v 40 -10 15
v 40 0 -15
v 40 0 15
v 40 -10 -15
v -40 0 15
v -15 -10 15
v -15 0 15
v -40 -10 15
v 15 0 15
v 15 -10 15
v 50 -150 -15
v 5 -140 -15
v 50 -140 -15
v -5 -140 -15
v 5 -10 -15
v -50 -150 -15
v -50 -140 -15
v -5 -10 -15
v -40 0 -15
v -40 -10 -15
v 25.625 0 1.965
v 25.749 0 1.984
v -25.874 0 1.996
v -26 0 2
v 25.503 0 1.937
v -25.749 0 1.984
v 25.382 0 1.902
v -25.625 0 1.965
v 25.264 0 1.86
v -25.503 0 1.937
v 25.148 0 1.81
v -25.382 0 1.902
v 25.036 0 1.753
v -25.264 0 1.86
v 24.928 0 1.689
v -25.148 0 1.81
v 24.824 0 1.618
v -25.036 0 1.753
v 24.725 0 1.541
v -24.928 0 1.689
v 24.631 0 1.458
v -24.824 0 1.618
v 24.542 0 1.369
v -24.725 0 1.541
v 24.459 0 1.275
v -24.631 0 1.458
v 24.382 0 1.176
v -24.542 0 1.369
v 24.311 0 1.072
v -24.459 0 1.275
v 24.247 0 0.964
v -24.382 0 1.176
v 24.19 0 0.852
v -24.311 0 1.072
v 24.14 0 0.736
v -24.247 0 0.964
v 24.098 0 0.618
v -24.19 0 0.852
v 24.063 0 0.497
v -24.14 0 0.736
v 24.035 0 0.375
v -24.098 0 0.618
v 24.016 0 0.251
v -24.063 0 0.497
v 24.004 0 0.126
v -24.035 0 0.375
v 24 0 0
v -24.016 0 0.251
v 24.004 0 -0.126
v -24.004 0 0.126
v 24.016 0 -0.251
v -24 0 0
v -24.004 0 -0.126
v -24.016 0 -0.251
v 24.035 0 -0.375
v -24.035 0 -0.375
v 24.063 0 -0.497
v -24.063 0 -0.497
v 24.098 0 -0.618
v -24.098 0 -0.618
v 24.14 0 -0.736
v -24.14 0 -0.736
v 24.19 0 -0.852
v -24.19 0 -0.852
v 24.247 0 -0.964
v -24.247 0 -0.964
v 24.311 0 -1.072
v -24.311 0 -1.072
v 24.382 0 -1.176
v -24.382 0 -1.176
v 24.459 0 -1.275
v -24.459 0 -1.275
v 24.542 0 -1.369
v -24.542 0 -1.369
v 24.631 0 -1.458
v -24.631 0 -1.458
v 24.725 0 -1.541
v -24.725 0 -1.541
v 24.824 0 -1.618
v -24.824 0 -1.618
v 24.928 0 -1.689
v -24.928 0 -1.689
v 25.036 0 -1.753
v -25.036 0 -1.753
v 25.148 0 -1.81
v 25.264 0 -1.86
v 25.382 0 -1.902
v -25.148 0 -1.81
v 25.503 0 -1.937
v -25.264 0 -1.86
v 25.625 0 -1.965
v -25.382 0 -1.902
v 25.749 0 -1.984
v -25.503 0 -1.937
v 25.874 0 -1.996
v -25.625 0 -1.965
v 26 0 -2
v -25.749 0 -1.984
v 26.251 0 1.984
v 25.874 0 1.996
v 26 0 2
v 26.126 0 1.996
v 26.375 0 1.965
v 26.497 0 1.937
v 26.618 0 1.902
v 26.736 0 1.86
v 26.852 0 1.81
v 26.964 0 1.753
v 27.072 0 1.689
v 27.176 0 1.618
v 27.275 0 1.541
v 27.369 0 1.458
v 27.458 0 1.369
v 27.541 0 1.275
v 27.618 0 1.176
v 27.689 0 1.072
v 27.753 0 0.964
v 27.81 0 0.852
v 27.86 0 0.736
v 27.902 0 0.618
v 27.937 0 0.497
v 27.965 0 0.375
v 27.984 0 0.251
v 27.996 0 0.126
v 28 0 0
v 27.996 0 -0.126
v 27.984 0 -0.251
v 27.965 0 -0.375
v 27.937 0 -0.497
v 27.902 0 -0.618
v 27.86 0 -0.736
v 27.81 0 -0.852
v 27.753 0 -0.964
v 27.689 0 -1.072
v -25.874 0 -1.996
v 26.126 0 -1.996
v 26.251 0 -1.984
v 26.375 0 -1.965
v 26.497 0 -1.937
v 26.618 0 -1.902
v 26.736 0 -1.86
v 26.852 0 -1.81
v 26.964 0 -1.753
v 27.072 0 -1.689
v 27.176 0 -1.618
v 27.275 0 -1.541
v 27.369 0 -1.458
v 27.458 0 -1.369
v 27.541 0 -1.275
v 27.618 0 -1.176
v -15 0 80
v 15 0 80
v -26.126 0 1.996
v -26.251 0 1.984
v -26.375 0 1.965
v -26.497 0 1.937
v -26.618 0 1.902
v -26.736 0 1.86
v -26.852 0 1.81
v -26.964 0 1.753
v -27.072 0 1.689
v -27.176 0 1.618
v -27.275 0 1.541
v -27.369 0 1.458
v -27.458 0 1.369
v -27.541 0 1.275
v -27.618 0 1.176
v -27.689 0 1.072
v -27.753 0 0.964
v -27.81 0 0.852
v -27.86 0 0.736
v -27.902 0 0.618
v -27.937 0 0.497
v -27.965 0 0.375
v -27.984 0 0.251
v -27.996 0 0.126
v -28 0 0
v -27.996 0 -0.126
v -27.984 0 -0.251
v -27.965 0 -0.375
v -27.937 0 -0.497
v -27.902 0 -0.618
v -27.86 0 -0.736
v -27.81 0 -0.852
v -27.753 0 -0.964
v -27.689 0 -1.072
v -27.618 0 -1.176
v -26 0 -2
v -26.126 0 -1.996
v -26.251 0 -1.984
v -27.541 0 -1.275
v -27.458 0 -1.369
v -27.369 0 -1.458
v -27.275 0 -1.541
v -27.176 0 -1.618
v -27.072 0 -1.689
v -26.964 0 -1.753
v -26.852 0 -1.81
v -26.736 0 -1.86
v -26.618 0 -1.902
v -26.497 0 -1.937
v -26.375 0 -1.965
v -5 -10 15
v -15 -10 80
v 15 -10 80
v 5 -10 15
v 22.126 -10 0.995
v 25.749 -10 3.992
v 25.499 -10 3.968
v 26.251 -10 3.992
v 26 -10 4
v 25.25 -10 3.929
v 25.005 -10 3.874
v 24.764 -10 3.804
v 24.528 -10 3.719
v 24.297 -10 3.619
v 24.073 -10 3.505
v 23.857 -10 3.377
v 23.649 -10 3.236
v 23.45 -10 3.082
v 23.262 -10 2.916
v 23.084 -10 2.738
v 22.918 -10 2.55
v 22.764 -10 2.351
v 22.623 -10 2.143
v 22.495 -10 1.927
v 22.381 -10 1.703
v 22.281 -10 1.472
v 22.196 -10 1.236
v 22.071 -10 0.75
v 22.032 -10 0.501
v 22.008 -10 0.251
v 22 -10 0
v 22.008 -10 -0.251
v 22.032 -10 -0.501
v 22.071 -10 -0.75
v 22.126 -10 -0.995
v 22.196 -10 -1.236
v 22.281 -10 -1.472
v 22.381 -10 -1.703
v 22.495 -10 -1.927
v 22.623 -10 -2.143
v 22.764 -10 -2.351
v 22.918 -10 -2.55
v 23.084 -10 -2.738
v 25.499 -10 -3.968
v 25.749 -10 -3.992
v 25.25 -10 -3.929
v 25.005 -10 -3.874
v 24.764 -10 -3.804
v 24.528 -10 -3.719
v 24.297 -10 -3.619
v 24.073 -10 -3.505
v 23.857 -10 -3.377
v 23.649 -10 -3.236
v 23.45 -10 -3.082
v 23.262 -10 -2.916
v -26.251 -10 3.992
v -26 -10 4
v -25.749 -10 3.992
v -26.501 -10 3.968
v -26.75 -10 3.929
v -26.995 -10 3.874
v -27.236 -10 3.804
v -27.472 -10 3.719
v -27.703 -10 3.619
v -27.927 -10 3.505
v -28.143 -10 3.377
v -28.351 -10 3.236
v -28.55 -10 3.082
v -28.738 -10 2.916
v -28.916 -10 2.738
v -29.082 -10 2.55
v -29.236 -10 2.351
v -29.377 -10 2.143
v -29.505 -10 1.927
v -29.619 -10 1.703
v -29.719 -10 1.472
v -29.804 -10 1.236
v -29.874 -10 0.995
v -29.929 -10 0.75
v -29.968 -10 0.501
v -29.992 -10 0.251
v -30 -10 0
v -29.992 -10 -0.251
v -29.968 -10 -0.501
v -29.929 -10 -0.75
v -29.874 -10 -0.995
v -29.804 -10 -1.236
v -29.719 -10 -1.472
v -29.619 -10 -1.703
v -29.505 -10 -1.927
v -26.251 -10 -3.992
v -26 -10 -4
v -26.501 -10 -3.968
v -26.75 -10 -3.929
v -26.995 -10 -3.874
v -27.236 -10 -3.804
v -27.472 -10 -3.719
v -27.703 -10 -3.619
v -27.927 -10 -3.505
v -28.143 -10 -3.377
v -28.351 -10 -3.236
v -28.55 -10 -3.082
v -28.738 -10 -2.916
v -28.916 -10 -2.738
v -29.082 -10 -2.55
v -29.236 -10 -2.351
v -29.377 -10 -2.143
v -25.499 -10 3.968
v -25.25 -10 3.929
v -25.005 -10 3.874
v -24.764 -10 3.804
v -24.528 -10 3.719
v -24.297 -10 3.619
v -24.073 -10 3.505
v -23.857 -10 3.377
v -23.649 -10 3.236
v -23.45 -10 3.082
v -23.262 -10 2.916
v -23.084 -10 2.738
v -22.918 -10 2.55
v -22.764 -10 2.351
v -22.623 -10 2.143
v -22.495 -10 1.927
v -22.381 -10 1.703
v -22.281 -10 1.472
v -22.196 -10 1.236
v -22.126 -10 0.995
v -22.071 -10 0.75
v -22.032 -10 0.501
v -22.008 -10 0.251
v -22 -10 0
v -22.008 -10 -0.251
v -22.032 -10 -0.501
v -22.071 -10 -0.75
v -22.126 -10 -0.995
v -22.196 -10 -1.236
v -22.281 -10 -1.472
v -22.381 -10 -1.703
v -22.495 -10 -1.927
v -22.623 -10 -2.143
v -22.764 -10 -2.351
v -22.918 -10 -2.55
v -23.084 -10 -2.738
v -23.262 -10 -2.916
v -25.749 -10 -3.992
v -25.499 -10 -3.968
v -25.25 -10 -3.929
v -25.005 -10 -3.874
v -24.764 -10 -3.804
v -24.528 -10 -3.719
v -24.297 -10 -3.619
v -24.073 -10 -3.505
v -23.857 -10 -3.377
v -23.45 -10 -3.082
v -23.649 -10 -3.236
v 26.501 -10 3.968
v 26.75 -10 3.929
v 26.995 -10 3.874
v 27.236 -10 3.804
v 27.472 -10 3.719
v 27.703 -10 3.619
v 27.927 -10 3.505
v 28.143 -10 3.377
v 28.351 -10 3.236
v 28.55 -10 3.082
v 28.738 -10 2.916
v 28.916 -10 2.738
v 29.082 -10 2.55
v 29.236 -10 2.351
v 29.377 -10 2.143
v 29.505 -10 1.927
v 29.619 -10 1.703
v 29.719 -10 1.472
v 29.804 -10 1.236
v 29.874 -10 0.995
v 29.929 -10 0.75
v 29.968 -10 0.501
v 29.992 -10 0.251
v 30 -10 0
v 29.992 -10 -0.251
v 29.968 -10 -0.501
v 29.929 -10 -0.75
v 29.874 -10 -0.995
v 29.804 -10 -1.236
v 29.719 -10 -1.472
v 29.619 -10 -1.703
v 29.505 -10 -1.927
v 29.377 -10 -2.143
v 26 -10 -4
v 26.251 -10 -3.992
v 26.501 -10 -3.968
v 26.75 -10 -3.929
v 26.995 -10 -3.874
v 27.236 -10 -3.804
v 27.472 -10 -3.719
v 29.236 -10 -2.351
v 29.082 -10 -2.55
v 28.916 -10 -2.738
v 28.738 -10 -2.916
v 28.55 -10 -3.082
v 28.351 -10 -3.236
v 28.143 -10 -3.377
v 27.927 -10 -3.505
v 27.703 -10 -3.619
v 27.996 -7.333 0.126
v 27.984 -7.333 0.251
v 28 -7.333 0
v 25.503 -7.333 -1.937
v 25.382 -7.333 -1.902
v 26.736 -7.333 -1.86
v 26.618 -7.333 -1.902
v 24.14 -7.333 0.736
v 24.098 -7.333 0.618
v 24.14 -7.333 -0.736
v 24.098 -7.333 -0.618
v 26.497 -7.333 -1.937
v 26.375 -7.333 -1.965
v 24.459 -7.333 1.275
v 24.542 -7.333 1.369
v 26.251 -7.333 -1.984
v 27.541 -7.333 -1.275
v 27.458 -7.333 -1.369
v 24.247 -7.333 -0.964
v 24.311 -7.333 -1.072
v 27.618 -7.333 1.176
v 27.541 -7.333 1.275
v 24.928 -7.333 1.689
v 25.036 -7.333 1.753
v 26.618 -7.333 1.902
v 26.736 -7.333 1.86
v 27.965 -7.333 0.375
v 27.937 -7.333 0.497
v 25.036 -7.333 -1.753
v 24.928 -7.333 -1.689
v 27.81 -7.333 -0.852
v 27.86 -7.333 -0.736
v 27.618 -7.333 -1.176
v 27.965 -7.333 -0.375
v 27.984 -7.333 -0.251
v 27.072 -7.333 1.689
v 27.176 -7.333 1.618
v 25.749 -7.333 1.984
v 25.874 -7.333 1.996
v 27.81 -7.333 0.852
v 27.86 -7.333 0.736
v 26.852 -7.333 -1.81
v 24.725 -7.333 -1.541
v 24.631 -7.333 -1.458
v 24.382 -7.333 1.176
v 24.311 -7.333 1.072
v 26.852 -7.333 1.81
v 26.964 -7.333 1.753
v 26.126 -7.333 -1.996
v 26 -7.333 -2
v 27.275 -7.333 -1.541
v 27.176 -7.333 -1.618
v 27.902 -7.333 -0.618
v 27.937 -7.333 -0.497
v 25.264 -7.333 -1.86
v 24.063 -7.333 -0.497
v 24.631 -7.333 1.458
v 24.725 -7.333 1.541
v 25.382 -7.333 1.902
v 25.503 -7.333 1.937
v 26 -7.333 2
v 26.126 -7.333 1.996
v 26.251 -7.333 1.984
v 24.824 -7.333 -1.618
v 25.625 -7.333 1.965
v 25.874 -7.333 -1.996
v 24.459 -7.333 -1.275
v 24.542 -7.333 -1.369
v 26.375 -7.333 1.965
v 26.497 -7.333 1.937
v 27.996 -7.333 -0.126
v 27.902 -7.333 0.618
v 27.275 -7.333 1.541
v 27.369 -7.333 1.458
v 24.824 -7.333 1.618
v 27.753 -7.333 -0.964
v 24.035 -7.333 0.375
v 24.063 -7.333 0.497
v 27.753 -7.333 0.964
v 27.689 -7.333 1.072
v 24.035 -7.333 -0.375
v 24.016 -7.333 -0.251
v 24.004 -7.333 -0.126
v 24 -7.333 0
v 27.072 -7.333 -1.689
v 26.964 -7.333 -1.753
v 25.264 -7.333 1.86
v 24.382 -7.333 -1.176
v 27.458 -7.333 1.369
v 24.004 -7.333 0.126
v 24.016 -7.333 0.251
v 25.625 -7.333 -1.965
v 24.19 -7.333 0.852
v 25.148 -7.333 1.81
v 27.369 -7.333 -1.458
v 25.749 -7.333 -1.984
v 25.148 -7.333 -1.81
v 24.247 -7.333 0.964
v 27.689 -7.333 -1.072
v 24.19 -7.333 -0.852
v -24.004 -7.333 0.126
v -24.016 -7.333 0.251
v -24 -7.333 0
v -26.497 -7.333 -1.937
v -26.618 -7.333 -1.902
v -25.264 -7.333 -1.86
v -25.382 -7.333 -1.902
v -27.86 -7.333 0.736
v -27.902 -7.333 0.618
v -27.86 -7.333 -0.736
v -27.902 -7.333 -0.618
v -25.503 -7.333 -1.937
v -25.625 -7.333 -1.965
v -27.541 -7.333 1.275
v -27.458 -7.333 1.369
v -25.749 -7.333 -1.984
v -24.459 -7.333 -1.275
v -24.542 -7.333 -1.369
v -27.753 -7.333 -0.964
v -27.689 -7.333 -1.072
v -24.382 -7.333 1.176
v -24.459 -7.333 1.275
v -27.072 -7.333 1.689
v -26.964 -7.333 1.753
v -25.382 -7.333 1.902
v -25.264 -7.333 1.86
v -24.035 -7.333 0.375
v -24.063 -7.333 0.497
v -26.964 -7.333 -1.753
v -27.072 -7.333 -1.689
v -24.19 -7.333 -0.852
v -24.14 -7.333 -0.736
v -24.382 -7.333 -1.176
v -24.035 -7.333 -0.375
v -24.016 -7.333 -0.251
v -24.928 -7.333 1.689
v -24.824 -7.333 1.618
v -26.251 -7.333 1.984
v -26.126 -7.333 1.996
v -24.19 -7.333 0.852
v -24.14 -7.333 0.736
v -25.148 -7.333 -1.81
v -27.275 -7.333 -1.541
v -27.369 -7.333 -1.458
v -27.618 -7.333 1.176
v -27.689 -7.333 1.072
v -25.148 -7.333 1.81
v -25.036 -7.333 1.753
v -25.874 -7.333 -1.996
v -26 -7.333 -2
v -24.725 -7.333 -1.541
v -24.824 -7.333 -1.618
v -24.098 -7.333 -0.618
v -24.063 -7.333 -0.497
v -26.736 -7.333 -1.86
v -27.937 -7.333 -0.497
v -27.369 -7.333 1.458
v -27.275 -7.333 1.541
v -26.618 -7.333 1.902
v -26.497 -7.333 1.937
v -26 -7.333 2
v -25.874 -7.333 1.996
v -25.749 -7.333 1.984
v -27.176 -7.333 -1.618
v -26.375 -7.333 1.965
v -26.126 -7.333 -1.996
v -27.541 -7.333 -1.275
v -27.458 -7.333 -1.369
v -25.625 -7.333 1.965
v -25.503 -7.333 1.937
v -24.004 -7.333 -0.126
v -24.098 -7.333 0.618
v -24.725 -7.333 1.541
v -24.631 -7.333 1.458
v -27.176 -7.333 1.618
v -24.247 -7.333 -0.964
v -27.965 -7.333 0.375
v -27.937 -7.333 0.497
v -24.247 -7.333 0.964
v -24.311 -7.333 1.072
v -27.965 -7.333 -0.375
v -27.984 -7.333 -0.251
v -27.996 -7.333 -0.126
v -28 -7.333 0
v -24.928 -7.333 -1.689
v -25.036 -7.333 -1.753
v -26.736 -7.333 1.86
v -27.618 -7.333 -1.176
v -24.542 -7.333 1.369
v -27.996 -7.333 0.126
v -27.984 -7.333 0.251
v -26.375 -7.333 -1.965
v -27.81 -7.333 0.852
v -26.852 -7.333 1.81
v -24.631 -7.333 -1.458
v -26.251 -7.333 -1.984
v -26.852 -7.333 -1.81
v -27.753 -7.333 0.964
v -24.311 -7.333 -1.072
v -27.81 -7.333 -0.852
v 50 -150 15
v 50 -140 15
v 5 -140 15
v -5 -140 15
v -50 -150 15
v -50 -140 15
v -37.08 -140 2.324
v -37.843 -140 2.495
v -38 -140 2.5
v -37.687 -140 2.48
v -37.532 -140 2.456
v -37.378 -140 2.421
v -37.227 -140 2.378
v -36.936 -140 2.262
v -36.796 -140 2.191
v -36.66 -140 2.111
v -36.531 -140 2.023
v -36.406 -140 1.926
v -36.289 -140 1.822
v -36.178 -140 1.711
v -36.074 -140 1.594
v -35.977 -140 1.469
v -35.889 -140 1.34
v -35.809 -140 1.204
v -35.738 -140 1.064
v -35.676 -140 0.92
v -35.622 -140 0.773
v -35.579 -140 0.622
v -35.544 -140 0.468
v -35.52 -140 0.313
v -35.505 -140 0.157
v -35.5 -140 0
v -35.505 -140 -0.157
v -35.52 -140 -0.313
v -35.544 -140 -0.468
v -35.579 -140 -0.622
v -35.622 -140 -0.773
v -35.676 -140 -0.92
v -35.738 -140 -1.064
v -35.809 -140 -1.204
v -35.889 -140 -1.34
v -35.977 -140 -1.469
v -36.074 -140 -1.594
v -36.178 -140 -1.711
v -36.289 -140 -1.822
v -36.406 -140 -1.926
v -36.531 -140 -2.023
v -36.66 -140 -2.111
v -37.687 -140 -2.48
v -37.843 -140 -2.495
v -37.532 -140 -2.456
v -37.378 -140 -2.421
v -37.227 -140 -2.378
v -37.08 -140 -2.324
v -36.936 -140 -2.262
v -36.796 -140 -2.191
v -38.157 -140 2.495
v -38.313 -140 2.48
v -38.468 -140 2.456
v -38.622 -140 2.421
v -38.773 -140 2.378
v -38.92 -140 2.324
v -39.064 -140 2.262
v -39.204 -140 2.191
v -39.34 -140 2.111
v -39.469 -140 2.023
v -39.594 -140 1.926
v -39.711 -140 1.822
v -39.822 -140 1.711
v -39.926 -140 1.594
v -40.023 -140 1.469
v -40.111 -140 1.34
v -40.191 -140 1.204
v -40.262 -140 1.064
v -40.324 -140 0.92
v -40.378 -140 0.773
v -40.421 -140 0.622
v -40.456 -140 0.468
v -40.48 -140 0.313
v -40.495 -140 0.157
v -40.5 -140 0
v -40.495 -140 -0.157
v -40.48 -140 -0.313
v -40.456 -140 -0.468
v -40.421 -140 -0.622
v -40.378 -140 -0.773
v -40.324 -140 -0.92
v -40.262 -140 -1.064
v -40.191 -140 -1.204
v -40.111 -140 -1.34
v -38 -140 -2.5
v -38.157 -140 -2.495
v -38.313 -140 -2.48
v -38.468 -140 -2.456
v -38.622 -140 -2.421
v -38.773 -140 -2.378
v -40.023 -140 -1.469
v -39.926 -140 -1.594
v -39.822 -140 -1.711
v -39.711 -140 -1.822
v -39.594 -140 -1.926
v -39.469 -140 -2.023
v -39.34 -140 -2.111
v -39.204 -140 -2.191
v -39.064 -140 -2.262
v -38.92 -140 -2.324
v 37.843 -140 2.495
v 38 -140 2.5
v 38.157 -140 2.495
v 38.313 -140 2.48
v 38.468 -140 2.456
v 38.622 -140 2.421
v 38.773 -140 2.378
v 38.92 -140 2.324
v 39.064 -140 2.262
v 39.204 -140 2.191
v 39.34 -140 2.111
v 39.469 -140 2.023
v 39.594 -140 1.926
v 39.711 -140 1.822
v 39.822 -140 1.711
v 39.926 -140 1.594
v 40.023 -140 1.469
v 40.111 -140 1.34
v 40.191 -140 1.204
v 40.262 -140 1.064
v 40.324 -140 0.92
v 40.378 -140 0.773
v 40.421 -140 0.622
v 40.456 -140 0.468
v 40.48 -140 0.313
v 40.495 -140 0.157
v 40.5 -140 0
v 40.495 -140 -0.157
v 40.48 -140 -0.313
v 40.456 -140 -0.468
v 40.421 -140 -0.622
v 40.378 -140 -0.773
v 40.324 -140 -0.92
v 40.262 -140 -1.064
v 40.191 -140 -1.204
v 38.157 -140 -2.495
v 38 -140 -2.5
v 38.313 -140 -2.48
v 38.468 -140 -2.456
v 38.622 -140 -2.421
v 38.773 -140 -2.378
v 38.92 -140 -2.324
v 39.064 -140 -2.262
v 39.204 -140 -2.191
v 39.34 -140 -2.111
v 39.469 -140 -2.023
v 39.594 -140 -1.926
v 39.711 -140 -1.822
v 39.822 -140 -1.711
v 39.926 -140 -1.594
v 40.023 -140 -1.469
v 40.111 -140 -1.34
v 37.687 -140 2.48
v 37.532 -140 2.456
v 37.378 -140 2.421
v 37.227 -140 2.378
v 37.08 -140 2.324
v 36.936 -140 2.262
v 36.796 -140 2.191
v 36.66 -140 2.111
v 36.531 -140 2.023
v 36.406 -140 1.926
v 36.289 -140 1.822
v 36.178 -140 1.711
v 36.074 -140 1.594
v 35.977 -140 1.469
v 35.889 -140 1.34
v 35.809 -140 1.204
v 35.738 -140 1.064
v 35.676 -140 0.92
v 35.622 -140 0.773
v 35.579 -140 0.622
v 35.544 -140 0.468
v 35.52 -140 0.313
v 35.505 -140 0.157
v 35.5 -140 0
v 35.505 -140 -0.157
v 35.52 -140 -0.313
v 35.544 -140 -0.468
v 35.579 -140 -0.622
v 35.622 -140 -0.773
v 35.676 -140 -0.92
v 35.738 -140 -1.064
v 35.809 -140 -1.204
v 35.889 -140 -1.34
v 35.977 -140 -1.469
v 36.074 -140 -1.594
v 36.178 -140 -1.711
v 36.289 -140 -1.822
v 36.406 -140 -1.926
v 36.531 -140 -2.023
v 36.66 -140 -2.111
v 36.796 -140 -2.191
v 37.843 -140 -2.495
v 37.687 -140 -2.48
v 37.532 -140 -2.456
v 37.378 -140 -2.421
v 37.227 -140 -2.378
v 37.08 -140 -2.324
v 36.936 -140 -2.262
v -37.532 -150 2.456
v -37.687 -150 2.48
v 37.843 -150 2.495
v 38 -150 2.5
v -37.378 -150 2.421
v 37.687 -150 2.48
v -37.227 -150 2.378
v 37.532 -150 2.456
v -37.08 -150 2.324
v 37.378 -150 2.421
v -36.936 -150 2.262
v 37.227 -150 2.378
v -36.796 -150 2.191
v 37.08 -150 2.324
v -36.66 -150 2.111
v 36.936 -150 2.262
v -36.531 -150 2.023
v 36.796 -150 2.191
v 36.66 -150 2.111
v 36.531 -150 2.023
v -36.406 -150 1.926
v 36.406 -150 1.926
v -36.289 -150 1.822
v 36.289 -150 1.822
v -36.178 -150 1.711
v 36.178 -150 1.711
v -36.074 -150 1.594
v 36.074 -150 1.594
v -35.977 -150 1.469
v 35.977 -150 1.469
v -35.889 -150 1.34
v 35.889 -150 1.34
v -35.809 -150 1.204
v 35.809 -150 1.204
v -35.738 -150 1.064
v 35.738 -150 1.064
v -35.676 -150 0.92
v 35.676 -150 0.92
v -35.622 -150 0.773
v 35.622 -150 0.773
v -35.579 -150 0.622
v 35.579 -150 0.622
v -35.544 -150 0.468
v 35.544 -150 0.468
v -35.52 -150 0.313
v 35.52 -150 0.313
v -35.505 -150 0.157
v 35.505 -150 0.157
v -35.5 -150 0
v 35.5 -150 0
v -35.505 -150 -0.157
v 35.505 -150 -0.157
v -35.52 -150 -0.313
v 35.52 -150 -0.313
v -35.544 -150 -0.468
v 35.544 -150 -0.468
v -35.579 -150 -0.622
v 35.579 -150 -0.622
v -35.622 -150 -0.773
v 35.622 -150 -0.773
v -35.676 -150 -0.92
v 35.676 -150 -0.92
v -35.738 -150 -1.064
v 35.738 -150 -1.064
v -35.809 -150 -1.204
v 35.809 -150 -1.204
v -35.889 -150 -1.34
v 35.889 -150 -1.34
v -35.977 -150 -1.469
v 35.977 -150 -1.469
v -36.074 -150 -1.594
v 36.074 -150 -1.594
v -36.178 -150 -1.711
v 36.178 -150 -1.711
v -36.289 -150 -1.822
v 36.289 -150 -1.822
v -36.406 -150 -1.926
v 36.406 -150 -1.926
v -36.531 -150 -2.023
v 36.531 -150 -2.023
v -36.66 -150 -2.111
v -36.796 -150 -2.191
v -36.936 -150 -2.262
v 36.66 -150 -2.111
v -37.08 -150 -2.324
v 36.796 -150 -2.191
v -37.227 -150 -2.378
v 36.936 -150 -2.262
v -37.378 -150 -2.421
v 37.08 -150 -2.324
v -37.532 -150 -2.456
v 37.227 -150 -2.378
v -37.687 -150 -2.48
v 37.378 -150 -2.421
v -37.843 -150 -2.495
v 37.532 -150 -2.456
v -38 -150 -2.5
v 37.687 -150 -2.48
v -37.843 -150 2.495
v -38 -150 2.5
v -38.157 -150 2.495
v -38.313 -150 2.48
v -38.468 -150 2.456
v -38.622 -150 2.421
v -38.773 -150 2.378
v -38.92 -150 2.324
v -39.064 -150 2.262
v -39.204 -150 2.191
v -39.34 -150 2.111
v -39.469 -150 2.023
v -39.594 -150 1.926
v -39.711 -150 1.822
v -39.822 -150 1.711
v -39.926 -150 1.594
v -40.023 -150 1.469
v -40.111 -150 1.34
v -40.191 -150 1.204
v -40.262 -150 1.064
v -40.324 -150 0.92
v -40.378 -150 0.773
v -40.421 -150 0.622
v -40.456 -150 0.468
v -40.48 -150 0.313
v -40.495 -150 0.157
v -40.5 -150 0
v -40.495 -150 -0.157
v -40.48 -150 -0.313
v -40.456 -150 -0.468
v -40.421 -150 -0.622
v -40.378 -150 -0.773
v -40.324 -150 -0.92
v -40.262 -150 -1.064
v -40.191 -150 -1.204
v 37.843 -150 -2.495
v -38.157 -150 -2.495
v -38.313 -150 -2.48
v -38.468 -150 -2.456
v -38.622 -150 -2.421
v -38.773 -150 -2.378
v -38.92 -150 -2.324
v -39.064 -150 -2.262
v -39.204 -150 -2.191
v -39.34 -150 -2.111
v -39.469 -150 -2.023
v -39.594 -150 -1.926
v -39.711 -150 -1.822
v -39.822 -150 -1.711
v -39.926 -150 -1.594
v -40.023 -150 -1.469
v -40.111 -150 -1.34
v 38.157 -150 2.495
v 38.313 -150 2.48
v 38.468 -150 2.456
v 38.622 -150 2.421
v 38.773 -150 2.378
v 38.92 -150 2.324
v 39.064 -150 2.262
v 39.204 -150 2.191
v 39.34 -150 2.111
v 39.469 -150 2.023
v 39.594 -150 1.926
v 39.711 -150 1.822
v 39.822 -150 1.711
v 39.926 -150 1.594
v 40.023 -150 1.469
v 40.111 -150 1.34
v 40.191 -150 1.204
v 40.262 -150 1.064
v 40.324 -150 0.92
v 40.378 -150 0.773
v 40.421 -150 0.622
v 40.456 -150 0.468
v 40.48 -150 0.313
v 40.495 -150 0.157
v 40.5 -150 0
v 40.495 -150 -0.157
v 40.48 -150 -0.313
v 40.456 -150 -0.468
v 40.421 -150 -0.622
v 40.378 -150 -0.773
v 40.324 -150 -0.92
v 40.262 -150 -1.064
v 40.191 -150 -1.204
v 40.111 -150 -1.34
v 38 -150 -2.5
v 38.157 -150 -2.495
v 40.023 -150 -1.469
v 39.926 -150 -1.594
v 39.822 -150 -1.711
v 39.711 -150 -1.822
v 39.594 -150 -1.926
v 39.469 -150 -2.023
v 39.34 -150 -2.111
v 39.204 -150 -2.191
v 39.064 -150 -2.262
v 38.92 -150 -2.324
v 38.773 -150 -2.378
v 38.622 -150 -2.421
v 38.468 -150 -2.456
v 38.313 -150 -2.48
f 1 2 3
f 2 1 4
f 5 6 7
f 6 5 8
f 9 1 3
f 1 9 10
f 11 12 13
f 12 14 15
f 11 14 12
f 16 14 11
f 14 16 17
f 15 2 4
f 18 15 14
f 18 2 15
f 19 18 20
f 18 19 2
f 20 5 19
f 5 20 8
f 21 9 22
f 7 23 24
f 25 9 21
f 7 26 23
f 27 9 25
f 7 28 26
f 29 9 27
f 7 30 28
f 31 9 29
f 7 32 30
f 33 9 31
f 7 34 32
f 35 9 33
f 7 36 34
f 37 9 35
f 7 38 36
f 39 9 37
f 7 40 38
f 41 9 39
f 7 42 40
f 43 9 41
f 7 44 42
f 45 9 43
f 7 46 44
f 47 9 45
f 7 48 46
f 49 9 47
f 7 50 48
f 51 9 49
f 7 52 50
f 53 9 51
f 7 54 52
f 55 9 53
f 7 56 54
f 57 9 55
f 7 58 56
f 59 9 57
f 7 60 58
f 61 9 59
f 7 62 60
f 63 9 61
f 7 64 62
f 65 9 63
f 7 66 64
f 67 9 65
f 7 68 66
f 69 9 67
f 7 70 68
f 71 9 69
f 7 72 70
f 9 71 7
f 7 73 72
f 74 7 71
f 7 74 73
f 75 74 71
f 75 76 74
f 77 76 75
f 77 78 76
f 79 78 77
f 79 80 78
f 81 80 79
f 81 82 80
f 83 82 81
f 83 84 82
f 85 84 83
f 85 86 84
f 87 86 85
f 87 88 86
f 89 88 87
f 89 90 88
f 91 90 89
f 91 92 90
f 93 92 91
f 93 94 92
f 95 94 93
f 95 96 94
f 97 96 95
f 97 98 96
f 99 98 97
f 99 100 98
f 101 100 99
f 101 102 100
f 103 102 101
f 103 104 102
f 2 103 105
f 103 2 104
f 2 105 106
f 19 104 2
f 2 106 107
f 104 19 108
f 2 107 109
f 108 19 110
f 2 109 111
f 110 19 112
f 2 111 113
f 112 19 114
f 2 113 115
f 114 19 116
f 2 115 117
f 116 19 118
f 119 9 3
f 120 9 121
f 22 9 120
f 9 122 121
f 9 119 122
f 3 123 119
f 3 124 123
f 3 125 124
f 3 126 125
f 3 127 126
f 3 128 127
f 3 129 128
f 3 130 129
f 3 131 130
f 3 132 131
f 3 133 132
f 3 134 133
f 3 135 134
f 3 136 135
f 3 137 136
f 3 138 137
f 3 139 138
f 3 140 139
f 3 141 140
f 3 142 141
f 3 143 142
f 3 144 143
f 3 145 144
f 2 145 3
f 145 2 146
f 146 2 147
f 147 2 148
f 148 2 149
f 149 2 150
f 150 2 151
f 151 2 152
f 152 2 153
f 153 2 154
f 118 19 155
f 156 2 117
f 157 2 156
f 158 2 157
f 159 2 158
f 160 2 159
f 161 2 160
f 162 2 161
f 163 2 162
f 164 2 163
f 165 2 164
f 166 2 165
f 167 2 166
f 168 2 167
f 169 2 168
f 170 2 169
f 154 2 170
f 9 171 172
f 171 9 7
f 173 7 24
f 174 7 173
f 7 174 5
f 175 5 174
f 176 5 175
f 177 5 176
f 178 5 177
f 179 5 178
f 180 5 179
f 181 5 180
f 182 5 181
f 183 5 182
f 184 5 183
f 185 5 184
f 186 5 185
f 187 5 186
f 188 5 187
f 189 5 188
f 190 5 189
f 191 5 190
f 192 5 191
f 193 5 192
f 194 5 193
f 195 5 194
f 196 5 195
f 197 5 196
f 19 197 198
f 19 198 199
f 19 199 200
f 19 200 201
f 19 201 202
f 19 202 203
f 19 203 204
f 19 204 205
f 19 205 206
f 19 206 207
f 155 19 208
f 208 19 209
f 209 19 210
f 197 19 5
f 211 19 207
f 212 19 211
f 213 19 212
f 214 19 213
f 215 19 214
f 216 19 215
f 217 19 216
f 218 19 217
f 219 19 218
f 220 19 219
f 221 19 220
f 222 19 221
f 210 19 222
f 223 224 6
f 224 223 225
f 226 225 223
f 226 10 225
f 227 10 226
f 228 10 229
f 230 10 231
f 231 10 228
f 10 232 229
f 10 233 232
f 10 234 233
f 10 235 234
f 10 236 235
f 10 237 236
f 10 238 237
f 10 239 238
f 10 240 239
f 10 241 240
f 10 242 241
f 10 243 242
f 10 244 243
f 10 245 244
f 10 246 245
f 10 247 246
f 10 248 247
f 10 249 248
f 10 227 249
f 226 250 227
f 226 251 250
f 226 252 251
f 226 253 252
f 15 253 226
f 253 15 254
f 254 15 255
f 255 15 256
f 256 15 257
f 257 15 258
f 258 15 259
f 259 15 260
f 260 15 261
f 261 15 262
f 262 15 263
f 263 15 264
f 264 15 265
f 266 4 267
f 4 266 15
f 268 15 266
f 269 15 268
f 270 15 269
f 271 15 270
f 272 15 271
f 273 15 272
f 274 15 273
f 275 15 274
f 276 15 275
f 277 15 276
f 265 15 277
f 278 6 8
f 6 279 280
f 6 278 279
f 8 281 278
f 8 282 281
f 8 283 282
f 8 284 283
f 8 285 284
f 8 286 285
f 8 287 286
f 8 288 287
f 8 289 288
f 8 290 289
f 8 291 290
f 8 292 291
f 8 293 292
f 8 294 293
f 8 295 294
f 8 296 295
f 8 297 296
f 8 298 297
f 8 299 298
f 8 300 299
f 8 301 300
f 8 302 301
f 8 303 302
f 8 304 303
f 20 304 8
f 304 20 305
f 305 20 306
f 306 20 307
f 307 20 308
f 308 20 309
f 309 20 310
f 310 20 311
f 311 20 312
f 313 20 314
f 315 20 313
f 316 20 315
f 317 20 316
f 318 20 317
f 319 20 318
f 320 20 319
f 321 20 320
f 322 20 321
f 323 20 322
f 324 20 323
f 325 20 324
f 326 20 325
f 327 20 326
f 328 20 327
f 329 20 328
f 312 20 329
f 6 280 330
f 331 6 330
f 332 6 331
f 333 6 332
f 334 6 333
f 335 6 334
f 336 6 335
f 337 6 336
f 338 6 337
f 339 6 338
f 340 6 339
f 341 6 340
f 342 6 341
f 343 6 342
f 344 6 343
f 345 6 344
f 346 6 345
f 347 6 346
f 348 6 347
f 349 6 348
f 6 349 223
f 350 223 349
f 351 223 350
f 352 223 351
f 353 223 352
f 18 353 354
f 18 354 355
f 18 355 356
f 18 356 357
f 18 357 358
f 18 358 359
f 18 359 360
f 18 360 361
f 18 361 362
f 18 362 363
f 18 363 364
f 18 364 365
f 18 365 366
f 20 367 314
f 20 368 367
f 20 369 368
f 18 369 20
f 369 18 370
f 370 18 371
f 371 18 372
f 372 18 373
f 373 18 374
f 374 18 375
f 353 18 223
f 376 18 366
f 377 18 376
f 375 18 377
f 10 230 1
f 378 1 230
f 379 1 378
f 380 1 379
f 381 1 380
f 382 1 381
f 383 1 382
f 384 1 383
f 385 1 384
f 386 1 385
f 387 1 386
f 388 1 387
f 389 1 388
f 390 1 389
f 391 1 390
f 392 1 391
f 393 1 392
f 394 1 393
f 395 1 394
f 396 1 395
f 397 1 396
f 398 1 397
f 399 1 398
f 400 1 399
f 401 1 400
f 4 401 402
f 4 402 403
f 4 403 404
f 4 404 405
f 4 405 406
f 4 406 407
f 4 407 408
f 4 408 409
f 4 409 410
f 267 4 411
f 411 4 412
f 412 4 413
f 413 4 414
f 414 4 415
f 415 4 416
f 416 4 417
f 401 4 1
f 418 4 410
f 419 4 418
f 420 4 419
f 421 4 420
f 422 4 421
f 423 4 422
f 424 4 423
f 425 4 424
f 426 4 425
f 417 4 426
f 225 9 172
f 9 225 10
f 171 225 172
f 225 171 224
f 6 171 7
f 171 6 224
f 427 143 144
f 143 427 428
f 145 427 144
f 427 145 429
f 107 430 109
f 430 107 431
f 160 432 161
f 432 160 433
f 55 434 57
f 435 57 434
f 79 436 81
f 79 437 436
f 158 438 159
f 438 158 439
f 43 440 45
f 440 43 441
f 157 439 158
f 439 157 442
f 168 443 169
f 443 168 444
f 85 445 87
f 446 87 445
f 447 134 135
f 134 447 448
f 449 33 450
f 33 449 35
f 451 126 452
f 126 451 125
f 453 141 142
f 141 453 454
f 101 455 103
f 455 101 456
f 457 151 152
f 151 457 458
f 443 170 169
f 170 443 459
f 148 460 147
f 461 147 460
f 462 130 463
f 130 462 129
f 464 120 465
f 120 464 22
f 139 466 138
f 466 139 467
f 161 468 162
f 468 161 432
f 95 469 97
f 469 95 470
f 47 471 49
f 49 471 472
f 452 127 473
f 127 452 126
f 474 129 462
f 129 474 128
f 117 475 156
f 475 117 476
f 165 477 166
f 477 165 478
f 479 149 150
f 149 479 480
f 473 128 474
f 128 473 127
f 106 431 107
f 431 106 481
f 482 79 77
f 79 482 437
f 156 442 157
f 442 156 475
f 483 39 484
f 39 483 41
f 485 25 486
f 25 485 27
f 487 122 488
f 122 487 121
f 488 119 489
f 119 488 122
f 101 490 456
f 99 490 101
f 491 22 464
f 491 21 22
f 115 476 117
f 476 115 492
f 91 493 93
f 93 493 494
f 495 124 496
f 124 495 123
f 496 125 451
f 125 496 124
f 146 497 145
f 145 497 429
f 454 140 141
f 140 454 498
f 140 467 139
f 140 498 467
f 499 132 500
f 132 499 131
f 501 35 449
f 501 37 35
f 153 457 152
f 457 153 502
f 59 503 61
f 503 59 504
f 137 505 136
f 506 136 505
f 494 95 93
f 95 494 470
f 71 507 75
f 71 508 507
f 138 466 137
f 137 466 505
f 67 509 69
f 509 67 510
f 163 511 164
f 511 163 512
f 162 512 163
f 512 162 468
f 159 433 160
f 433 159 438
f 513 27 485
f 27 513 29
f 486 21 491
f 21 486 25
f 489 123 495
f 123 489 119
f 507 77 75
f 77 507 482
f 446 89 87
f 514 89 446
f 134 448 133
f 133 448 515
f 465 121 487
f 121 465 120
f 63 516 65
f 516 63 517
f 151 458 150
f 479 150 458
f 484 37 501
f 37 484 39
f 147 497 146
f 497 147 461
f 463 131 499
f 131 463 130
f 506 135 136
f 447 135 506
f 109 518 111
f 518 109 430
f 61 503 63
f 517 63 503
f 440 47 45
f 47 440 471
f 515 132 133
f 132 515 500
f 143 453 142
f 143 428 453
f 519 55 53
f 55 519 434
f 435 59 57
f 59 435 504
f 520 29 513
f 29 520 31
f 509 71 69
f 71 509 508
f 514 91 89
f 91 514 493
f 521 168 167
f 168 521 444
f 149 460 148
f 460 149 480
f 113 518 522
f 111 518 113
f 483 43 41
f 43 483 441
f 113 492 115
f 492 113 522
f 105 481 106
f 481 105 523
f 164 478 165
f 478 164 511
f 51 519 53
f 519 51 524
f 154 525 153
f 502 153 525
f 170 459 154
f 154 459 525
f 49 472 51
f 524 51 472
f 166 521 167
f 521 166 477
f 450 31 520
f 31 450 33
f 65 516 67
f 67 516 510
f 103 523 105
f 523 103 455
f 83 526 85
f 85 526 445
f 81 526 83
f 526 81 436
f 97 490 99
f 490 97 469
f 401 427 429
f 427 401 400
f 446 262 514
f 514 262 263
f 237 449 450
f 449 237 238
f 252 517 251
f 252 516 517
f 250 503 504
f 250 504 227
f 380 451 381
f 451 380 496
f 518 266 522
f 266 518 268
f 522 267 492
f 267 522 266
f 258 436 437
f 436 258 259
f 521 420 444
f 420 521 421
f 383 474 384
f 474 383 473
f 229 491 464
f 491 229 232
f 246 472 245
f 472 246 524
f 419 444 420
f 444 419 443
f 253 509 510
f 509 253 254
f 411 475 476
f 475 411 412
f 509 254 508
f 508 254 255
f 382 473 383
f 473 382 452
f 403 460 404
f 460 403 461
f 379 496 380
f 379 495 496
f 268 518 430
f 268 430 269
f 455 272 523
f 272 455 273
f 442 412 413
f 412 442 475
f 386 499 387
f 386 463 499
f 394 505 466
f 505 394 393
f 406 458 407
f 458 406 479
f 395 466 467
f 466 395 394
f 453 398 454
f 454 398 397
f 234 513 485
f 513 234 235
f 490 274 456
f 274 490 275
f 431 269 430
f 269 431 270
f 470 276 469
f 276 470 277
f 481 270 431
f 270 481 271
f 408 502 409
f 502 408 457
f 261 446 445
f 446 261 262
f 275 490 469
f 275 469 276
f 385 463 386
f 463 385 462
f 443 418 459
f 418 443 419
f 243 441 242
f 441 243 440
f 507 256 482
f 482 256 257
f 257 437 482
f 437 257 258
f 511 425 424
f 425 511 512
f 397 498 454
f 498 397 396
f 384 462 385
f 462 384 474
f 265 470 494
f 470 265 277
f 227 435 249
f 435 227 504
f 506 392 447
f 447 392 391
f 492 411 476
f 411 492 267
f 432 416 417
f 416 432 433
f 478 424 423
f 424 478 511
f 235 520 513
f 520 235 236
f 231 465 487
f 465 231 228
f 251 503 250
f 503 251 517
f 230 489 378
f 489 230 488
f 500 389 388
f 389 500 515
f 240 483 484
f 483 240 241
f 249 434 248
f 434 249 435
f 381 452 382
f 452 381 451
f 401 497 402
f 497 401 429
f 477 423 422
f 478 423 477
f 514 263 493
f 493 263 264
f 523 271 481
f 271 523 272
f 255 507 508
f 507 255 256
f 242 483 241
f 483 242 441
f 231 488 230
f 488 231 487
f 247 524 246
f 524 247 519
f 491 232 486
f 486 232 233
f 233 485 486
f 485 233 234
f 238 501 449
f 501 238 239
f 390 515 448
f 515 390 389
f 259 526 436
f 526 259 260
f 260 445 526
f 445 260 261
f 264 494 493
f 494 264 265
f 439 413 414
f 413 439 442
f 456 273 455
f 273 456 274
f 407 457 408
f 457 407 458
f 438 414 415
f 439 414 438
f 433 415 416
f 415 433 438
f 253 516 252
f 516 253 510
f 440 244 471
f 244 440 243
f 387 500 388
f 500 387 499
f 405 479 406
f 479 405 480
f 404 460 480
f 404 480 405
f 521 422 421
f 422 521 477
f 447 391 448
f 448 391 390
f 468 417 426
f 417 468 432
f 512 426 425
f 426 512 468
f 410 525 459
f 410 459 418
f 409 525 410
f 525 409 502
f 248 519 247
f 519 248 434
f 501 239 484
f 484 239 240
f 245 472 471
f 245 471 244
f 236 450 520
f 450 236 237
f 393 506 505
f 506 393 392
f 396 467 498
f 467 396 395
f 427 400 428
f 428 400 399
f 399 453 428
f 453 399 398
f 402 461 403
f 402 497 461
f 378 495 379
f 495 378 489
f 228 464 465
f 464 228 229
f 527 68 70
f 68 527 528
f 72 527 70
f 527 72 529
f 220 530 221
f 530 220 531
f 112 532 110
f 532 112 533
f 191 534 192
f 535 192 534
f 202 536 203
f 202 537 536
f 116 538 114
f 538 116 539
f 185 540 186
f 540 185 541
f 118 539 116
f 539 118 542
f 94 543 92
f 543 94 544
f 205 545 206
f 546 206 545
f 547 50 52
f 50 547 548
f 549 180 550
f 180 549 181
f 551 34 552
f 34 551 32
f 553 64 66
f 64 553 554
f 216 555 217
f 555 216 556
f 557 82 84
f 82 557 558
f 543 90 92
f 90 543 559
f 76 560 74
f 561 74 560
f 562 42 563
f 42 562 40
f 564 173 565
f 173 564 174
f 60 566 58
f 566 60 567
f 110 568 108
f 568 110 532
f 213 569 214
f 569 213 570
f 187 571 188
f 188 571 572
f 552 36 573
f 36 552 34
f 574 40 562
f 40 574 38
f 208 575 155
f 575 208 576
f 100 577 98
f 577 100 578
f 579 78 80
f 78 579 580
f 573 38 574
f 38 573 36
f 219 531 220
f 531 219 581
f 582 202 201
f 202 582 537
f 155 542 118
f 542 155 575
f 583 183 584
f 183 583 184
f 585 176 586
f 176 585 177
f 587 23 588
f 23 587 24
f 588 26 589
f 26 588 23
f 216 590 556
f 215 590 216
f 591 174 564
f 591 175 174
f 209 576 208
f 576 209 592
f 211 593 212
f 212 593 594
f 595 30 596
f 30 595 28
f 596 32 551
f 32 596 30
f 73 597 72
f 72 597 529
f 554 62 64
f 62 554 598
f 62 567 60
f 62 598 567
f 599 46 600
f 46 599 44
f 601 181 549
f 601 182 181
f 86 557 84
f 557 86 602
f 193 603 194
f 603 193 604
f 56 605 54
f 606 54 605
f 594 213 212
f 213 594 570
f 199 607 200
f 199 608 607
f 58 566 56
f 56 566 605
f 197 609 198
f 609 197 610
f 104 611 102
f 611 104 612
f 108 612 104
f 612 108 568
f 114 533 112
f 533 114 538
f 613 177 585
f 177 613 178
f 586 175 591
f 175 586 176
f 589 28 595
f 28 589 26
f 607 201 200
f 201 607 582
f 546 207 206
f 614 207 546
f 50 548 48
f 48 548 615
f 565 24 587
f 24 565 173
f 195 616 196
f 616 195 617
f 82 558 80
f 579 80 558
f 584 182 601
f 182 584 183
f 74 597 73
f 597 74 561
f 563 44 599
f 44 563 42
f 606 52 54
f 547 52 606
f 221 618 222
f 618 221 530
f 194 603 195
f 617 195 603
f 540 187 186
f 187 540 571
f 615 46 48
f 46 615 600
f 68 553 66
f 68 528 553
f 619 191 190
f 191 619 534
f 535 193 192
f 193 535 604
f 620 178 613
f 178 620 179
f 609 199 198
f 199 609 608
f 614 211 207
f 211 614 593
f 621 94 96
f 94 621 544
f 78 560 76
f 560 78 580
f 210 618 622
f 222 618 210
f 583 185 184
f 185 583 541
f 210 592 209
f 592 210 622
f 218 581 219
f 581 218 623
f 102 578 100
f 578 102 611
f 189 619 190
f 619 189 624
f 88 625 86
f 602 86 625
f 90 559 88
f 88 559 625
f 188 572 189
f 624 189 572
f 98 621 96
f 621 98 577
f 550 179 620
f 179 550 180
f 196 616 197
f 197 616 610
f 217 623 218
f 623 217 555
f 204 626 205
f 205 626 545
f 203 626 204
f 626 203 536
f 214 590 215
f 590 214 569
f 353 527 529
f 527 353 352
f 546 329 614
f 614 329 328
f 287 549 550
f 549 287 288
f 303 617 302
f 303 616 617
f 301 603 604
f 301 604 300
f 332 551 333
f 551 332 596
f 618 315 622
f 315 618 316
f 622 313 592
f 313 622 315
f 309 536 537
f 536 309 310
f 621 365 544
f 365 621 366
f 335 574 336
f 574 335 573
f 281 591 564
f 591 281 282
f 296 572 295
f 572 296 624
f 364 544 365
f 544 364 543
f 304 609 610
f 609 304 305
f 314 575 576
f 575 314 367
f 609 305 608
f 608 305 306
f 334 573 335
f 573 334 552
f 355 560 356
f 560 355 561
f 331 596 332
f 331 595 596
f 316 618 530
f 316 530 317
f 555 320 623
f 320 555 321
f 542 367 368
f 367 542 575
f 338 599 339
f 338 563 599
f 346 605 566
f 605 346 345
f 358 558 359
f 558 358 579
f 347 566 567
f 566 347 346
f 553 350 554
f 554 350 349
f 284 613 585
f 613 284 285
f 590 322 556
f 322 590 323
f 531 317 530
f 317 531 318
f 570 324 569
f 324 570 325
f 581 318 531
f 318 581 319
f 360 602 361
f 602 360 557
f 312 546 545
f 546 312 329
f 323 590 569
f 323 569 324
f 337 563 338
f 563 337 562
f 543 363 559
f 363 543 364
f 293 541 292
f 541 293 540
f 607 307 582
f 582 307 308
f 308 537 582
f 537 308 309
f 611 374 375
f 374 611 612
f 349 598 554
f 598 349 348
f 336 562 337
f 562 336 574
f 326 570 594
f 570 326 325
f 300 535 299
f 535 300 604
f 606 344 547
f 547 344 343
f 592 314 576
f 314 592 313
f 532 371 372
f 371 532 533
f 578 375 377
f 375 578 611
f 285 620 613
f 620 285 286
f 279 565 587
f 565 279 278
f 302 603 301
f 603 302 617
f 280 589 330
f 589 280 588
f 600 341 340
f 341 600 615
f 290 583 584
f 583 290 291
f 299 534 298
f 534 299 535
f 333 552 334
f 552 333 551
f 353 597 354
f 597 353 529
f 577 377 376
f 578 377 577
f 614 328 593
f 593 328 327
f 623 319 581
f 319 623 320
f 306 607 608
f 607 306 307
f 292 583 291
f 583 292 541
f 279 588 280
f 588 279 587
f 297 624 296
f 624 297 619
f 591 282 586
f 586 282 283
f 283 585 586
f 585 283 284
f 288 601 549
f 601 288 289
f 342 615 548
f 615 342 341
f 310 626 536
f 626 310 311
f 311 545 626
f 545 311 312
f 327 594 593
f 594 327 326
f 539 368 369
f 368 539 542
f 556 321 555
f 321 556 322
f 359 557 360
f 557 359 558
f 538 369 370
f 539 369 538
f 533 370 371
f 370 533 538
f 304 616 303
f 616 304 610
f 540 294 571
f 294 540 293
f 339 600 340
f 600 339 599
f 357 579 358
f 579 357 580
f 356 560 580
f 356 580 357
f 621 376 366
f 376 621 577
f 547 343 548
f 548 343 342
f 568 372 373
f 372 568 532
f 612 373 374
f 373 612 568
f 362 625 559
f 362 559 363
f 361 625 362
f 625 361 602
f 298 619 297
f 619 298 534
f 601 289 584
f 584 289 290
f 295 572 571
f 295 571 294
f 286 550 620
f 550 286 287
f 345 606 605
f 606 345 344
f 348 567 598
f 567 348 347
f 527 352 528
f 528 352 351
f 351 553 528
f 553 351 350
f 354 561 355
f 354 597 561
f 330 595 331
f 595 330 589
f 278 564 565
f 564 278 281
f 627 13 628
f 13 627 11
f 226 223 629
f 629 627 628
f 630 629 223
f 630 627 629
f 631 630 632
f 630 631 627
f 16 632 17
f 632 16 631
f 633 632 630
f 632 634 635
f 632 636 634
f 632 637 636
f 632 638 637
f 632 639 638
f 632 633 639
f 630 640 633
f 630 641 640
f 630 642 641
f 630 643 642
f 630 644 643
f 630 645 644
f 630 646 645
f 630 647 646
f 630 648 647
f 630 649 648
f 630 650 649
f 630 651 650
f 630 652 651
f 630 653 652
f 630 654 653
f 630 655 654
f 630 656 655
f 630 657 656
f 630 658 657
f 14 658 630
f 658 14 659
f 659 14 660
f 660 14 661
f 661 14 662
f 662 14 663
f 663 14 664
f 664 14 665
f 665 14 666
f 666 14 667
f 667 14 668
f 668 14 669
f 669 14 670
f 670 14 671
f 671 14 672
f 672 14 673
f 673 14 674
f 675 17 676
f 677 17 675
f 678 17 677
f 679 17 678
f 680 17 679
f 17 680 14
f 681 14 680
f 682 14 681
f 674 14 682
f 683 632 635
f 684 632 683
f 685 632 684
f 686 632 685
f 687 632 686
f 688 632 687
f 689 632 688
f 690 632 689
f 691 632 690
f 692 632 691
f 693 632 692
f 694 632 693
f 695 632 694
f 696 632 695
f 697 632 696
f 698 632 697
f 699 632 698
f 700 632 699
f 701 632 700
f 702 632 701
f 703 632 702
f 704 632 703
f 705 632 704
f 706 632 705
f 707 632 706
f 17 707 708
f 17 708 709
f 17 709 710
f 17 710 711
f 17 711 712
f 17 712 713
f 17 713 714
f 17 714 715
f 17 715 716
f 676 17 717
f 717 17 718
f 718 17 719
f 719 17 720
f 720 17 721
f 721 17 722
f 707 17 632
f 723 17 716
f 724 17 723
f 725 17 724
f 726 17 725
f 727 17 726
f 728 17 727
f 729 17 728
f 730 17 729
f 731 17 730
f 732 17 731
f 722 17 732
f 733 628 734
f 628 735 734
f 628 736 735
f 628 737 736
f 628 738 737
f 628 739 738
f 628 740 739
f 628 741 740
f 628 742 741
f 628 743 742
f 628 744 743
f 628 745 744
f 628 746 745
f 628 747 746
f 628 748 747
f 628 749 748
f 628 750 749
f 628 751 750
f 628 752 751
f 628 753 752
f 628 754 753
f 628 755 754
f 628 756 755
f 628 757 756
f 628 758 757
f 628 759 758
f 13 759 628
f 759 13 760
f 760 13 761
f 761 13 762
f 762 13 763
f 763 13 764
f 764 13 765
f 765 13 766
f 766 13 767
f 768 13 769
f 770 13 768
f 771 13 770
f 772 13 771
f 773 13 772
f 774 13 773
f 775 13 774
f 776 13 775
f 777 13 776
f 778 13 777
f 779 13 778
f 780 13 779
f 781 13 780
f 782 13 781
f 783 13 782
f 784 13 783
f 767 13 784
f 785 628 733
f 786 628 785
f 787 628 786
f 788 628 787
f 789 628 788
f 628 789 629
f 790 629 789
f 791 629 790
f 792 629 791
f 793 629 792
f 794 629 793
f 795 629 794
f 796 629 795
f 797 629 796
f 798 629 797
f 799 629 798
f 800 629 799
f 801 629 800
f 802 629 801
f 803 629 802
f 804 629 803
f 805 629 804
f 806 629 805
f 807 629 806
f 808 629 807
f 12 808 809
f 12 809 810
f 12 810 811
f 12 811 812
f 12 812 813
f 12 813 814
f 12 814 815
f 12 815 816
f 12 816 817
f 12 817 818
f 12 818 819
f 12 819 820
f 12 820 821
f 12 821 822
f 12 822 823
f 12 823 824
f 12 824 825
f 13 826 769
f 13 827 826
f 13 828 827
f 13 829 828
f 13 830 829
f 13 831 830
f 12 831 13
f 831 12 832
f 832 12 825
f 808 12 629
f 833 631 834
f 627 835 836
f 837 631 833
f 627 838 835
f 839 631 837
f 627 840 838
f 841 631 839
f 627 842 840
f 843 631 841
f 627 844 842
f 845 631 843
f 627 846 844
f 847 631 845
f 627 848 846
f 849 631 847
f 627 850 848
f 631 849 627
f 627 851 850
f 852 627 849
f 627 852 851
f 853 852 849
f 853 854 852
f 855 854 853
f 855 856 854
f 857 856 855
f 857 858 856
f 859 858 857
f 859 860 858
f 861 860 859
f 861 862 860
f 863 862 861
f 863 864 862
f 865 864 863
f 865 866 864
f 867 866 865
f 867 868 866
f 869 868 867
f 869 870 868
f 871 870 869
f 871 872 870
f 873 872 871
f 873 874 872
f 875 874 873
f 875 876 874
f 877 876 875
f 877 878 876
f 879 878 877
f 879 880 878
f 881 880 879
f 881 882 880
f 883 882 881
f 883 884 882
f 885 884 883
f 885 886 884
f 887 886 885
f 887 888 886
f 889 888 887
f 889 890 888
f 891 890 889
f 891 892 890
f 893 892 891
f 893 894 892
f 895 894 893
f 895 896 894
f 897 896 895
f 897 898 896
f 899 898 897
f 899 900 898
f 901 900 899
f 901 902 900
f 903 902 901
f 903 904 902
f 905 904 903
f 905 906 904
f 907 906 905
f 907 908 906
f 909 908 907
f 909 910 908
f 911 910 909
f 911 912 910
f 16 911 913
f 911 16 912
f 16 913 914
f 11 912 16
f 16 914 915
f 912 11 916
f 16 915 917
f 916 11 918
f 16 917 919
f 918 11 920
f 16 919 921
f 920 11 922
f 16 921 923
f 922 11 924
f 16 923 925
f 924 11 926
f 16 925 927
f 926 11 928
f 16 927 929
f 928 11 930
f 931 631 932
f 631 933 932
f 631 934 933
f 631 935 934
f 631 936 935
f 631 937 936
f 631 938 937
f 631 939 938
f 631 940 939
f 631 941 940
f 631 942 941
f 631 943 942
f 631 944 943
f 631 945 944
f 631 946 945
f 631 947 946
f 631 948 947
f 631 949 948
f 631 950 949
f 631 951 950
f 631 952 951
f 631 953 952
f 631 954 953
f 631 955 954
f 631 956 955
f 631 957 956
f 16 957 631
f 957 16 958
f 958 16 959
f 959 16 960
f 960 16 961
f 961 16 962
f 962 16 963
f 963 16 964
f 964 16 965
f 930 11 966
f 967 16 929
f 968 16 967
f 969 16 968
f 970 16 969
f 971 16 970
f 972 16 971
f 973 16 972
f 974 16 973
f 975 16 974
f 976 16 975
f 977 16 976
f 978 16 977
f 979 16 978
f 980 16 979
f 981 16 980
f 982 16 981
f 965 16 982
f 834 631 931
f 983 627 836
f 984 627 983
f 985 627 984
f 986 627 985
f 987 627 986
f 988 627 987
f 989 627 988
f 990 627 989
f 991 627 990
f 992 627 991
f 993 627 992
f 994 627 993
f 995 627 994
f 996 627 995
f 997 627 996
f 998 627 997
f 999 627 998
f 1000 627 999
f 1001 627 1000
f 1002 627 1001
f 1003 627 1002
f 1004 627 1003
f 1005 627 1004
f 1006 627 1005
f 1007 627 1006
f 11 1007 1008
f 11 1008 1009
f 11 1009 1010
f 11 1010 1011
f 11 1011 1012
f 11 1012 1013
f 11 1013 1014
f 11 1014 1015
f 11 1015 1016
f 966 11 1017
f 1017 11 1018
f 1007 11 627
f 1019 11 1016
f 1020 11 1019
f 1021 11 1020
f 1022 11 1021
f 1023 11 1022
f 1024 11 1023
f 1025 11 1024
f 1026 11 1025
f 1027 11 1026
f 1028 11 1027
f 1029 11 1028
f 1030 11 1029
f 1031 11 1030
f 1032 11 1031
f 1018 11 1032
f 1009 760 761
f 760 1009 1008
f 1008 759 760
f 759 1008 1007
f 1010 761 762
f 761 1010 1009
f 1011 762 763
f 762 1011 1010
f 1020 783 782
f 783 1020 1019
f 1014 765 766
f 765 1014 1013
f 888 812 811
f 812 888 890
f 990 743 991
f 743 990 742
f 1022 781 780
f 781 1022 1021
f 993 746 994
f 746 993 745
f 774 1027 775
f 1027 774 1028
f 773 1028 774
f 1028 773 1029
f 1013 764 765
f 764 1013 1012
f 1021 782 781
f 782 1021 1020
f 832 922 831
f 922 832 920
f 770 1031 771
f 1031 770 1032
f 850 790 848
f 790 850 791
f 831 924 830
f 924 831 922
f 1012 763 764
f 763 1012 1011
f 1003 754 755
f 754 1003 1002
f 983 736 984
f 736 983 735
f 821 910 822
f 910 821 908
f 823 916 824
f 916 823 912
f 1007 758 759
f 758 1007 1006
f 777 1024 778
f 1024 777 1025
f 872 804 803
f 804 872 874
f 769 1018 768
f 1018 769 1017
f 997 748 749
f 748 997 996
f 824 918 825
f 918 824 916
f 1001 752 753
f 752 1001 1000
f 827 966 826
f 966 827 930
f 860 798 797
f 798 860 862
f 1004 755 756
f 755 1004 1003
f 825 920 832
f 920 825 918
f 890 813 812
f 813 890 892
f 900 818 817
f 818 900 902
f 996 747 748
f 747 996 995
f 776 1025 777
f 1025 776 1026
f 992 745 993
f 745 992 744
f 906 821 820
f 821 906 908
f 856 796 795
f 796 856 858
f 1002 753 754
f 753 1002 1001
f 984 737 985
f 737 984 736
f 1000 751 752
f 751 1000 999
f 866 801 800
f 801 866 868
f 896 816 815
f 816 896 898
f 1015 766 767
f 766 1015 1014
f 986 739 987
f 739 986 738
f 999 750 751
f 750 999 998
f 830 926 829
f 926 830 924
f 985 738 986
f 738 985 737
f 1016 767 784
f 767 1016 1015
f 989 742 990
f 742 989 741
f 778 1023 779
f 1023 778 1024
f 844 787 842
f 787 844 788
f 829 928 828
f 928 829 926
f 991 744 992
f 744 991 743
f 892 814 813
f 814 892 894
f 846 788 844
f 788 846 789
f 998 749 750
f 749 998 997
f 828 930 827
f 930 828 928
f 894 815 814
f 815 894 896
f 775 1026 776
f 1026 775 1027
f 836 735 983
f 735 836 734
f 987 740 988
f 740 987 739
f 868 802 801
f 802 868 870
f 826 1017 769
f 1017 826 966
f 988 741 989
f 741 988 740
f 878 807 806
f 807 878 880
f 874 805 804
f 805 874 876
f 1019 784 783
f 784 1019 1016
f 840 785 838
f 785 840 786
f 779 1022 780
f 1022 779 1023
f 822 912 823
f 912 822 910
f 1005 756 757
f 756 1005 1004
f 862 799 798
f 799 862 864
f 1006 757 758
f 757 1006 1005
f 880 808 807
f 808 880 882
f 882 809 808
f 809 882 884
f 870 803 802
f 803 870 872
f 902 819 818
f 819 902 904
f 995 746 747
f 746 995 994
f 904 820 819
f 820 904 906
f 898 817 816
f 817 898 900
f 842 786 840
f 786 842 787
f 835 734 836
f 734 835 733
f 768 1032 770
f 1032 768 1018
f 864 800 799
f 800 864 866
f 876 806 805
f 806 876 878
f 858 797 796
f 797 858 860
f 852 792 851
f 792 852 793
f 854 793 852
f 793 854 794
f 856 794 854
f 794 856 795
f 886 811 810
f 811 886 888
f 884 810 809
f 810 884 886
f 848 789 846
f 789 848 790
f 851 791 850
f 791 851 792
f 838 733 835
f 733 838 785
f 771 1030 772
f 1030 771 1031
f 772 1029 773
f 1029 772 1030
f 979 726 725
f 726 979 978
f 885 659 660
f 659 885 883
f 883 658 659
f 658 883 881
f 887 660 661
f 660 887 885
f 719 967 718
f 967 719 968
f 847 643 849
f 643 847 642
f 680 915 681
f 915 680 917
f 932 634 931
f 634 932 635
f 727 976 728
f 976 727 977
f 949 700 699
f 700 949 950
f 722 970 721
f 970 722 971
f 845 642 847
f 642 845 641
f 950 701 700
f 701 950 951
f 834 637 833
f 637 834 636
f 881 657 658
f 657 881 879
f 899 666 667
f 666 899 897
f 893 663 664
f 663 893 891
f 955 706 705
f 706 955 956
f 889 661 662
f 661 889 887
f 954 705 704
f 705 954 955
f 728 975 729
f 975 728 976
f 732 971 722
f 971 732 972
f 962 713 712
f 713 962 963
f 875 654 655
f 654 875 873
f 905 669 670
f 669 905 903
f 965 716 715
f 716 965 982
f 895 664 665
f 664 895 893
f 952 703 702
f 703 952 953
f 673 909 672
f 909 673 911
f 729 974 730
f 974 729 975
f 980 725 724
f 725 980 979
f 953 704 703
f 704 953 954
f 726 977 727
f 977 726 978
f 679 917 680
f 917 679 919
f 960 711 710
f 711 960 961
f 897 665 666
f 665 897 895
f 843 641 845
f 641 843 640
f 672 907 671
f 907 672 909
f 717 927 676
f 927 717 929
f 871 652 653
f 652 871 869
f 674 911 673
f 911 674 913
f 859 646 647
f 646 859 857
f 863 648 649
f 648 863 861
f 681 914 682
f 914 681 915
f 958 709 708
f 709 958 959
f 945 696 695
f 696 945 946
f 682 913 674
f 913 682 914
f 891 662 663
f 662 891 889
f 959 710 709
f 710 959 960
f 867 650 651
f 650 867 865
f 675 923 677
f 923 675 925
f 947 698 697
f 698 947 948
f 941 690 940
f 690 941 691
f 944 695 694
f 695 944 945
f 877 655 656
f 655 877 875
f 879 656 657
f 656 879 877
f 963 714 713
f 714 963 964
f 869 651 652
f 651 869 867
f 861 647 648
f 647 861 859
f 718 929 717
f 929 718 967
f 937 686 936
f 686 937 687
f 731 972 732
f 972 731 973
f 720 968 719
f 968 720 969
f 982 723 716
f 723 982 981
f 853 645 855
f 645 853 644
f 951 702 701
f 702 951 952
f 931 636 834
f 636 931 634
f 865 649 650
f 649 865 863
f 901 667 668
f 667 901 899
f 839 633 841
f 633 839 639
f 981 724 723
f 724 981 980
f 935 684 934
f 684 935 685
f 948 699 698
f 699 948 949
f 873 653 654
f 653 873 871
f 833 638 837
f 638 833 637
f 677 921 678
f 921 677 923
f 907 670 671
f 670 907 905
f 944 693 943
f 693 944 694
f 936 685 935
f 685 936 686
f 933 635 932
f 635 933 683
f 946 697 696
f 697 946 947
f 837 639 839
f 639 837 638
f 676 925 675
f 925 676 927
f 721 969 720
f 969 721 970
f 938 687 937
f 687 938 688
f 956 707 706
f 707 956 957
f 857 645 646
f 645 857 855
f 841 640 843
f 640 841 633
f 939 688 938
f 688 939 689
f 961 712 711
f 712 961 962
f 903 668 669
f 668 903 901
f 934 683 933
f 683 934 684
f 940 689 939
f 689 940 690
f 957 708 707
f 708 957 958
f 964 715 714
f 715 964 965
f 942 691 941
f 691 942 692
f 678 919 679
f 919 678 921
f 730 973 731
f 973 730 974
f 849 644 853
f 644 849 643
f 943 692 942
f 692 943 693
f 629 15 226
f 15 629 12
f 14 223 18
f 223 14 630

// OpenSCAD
$fn=100;

wall_dist=150;
thickness=10;
width=80;
width2=100;
height=30;

screw_dia=4;
screw_dia2=5;
screw_head=8;
screw_offs=width/4*1.3;

screw_dist=76;

back=25;

module screwhole()
{
  cylinder(d=screw_dia, h=thickness+1, center=true);
  translate([0, 0, thickness/2]) mirror([0, 0, 1]) cylinder(d2=0, d1=screw_head, h=screw_head*2/3, center=false);
}

module screwhole2()
{
  cylinder(d=screw_dia2, h=thickness+1, center=true);
  //translate([0, 0, thickness/2]) mirror([0, 0, 1]) cylinder(d2=0, d1=screw_head, h=screw_head*2/3, center=false);
}


//   FALI TARTO
translate([0, -thickness/2], 0) difference()
{
  union()
  {
    cube([width, thickness, height], center=true);
    translate([0, 0, width/2]) cube([height, thickness, width], center=true);
  }
  translate([screw_offs, 0, 0]) rotate([90, 0, 0]) screwhole();
  translate([-screw_offs, 0, 0]) rotate([90, 0, 0]) screwhole();
}

//   SZEKRENYHEZ ROGZITHETO
//rotate([0, 0, 45])
//{
//  difference()
//  {
//    union()
//    {
//      translate([70/2+thickness/2, 0, 0]) cube([70, thickness, height], center=true);
//      //translate([50/2+thickness/2, 0, 10]) cube([50, thickness, height], center=true);
//      //cylinder(d=thickness, h=height, center=true);
//    }
//    translate([50+thickness/2, 0, 0]) rotate([90, 0, 0]) screwhole2();
//  }
//  translate([0, 18.8/2+thickness/2, 0]) cube([thickness, 18.8+thickness*2, height], center=true);
//  translate([back/2+thickness/2, 18.8+thickness, 0]) cube([back, thickness, height], center=true);
//}

translate([0, -wall_dist/2, 0]) cube([thickness, wall_dist, height], center=true);

translate([0, -wall_dist+thickness/2, 0]) difference()
{
  cube([width2, thickness, height], center=true);
  translate([screw_dist/2, 0, 0]) rotate([-90, 0, 0]) screwhole2();
  translate([-screw_dist/2, 0, 0]) rotate([-90, 0, 0]) screwhole2();
}

//Tripod mount
//#union()
//{
//base_width=43.25;
//base_height=9.1;
//base_inset=4.1;
//base_cutout = 0.8;
//
//translate([-base_width/2, 20, -height/2]) {
//  union()
//  {
//    intersection()
//    {
//    	polyhedron(points=[[-base_cutout,-base_cutout,0],
//                       [base_inset,base_inset,base_height],
//                       [-base_cutout,base_width+base_cutout,0],
//                       [base_inset,base_width-base_inset,base_height],
//                       [base_width+base_cutout,base_width+base_cutout,0],
//                       [base_width-base_inset,base_width-base_inset,base_height],
//                       [base_width+base_cutout,-base_cutout,0],
//                       [base_width-base_inset,base_inset,base_height]],
//               triangles=[[2,1,0],[1,2,3],[4,3,2],[3,4,5],[6,5,4],[5,6,7],[0,7,6],[7,0,1],
//    				     [4,2,0],[0,6,4],[1,3,5],[5,7,1]]
//               );	
//  	  cube([base_width,base_width,50]);
//    }
//  }
//}
//
//  translate([-thickness/2, 0, 0]) cube([thickness, base_width/2+20, height/2]);
//  
//  translate([-(base_width-base_inset*2)/2, 20+base_inset, -height/2])
//    cube([base_width-base_inset*2, base_width-base_inset*2, height]);
//  
//  difference()
//  {
//    translate([-5, 0, 0]) mirror([0, 0, 1]) cube([thickness, 10, 10], center=false);
//    translate([0, 10, -10]) rotate([0, 90, 0]) cylinder(h=thickness, r=10, center=true);
//  }
//}

//Ajto tarto
//translate([0, -thickness/2, 0])
//{
//  rotate([0, 0, 45])
//  {
//    translate([0, 0, -height/2])
//    {
//      translate([0, 0, height/2]) cube([10, 10, 35]);
//      difference()
//      {
//        linear_extrude(height=45+height/2)
//        {
//          polygon(points=[[0, 0], [35, 0], [35, 14.5], [15, 14.5], [15, 24.5], [0, 24.5] ]);
//        }
//        translate([12, 0, 35+height/2]) rotate([90, 0, 0]) scale([1, 1, 5]) screwhole2();
//      }
//    }
//  }
//}
//
//fillet=20;
//difference()
//{
//  translate([0, -fillet/2, height/2+fillet/2]) cube([thickness, fillet, fillet], center=true);
//  translate([0, -fillet, height/2+fillet]) rotate([0, 90, 0]) cylinder(r=fillet, h=thickness+1, center=true);
//}
